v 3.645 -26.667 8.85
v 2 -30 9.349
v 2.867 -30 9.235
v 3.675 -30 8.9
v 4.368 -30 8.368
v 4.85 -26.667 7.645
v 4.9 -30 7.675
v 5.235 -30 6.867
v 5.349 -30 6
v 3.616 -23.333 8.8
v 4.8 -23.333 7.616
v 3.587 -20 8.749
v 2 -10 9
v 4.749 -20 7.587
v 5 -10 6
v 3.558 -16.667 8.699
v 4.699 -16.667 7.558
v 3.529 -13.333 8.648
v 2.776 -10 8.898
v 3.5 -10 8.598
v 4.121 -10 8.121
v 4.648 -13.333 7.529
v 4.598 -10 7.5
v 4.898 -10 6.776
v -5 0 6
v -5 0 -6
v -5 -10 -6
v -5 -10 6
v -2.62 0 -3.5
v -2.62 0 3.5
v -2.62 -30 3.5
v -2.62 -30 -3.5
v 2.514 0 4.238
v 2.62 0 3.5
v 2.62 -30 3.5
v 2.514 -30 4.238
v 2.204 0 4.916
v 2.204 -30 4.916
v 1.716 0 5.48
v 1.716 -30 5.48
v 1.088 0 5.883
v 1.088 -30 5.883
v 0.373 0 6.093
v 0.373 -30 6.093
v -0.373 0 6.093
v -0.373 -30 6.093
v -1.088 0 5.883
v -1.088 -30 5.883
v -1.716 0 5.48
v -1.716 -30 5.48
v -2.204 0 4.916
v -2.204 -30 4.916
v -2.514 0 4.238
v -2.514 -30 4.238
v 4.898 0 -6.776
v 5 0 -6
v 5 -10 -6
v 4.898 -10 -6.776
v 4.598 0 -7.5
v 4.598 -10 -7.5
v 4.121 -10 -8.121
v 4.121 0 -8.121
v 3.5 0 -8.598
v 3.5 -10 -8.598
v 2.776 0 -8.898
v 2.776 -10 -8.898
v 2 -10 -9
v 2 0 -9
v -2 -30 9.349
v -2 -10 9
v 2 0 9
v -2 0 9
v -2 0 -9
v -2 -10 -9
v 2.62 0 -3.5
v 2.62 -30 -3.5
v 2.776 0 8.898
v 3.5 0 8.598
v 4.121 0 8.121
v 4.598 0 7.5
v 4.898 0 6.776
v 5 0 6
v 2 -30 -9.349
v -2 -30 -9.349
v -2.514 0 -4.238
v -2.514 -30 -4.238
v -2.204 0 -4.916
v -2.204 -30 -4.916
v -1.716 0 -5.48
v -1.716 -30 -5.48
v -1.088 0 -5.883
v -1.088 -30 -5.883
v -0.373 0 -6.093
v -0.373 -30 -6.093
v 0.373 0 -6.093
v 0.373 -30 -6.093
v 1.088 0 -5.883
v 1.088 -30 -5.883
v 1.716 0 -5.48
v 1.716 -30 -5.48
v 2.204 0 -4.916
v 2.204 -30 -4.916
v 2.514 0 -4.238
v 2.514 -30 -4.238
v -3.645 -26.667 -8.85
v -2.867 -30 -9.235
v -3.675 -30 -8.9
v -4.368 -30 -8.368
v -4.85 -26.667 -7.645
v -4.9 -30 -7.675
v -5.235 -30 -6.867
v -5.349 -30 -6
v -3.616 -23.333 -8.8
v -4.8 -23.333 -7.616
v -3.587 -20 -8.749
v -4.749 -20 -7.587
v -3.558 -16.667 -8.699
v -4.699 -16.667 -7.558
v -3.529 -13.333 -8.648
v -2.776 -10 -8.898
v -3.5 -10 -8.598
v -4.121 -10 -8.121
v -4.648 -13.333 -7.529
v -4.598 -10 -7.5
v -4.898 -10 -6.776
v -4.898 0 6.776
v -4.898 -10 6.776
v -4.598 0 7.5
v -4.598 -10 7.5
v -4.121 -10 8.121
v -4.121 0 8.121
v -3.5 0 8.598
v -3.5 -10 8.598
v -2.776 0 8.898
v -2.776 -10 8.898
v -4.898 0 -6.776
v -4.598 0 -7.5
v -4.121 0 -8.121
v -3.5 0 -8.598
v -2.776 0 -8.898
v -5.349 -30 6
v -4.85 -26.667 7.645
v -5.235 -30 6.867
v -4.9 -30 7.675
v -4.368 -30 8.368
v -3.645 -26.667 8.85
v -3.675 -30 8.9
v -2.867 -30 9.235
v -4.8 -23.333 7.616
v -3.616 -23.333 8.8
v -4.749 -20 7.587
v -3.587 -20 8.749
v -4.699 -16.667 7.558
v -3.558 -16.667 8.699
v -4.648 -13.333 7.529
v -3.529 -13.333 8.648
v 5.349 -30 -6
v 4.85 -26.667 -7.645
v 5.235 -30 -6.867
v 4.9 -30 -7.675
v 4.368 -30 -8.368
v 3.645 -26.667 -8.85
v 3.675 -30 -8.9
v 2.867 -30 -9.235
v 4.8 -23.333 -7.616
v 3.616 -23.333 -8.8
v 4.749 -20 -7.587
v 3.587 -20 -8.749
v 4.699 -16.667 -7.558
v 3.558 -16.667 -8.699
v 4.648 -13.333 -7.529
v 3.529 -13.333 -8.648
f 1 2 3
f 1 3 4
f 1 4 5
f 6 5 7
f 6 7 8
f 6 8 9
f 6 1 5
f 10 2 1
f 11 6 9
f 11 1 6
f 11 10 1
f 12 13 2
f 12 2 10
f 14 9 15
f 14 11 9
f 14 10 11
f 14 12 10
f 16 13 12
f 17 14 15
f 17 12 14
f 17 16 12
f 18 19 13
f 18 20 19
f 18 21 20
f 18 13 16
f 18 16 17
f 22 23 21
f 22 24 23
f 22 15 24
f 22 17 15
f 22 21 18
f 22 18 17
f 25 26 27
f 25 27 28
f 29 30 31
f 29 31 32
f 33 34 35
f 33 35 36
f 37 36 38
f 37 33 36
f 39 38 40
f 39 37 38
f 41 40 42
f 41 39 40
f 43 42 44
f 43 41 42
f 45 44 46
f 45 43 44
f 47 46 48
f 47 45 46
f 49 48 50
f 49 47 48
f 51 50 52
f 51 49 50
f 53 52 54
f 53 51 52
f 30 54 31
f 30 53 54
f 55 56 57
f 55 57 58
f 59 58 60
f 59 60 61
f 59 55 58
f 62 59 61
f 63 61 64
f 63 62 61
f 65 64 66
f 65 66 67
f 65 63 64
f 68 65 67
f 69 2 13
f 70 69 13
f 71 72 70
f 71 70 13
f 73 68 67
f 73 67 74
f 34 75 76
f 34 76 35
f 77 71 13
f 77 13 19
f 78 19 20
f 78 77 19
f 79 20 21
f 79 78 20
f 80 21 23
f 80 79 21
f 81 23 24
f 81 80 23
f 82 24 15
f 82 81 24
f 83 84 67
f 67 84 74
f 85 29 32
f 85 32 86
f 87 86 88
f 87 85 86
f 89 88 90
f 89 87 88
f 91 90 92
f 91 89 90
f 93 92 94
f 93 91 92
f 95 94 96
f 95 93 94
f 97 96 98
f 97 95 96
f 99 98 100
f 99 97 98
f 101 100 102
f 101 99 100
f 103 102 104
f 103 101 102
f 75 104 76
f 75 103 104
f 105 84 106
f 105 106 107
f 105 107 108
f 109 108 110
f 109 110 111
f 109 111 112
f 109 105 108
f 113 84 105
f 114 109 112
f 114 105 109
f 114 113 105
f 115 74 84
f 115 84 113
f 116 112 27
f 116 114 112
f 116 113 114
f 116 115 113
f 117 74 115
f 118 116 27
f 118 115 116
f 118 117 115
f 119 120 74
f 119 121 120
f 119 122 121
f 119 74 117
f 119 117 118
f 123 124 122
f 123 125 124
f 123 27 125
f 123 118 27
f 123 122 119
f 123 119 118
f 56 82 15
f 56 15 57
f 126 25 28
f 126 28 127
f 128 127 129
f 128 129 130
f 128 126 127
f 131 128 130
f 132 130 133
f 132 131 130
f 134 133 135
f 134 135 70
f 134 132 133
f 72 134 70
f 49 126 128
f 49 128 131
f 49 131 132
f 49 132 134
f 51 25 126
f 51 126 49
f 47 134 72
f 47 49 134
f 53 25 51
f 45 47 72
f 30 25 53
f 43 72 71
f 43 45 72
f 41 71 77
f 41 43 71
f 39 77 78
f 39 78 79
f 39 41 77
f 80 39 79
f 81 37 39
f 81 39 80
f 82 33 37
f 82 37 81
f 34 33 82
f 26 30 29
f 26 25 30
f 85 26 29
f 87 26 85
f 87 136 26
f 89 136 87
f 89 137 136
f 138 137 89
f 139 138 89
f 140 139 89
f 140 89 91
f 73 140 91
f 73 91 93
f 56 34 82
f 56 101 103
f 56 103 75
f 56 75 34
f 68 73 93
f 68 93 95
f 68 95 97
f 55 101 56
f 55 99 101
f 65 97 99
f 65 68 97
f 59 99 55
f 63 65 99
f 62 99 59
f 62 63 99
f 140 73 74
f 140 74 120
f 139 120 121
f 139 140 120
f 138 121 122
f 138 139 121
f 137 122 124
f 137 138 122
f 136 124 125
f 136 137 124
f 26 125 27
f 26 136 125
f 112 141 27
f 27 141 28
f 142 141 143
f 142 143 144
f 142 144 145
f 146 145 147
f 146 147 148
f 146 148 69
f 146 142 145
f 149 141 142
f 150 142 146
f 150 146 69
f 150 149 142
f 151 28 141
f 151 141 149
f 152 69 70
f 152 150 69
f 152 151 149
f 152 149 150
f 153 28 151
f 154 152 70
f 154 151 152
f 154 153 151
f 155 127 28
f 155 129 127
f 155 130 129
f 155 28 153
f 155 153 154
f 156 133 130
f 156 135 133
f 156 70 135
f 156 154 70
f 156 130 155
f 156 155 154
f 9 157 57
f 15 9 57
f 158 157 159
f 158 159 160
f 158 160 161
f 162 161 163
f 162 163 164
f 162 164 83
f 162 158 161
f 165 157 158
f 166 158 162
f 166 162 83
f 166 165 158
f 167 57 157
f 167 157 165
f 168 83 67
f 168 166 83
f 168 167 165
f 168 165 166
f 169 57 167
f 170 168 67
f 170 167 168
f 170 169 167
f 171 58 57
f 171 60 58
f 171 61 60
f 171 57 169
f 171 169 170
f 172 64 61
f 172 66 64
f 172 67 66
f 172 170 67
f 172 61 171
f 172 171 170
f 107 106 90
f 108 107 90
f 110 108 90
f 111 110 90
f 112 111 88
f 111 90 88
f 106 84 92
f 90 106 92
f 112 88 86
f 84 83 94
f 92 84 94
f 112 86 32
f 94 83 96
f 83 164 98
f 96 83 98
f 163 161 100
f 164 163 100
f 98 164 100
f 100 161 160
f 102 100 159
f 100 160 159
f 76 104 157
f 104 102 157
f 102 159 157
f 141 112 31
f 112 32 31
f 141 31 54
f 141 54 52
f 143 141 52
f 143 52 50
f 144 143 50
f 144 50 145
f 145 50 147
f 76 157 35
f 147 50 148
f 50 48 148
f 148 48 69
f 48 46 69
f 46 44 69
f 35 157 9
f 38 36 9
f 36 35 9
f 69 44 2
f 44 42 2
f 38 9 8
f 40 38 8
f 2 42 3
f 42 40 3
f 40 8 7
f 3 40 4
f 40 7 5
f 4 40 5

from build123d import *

# Parameters (mm, degrees)
BOSS_EXTRUDE1_DEPTH = 30
CUT_EXTRUDE2_REACH  = 33.718


with BuildPart() as part:
    # Sketch1 → Boss-Extrude1 (new body)
    with BuildSketch(Plane(origin=(0, 0, 0), x_dir=(1, 0, 0), z_dir=(0, 1, 0))):
        with BuildLine():
            Line((-2, -9), (2, -9))
            ThreePointArc((2, -9), (4.121320344, -8.121320344), (5, -6))
            Line((5, -6), (5, 6))
            ThreePointArc((5, 6), (4.121320344, 8.121320344), (2, 9))
            Line((2, 9), (-2, 9))
            ThreePointArc((-2, 9), (-4.121320344, 8.121320344), (-5, 6))
            Line((-5, 6), (-5, -6))
            ThreePointArc((-5, -6), (-4.121320344, -8.121320344), (-2, -9))
        make_face()
    extrude(amount=-BOSS_EXTRUDE1_DEPTH)

    # Sketch5 → Cut-Extrude2 (cut, up to next)
    with BuildSketch(Plane(origin=(0, 0, 0), x_dir=(1, 0, 0), z_dir=(0, 1, 0)), mode=Mode.PRIVATE) as cut_extrude2_sk1:
        with BuildLine():
            Line((-2.62, -3.5), (-2.62, 3.5))
            ThreePointArc((-2.62, 3.5), (0, 6.12), (2.62, 3.5))
            Line((2.62, 3.5), (2.62, -3.5))
            ThreePointArc((2.62, -3.5), (0, -6.12), (-2.62, -3.5))
        make_face()
    cut_extrude2_tool1 = extrude(cut_extrude2_sk1.sketch, amount=-CUT_EXTRUDE2_REACH, mode=Mode.PRIVATE) & part.part
    add(cut_extrude2_tool1.solids().sort_by_distance((0, 0, 0))[0], mode=Mode.SUBTRACT)

    # Sweep1: sweep along a path in Sketch1<3>
    with BuildLine(Plane(origin=(0, 0, 0), x_dir=(1, 0, 0), z_dir=(0, 1, 0))) as sweep1_path:
        Line((-2, -9), (2, -9))
        ThreePointArc((2, -9), (4.121320344, -8.121320344), (5, -6))
        Line((5, -6), (5, 6))
        ThreePointArc((5, 6), (4.121320344, 8.121320344), (2, 9))
        Line((2, 9), (-2, 9))
        ThreePointArc((-2, 9), (-4.121320344, 8.121320344), (-5, 6))
        Line((-5, 6), (-5, -6))
        ThreePointArc((-5, -6), (-4.121320344, -8.121320344), (-2, -9))
    # Sketch6 → Sweep1 (sweep)
    with BuildSketch(Plane.XY):
        Polygon((5, -10), (5.349101299, -30), (5, -30), align=None)
    sweep(path=sweep1_path.line)


solid = part.part
